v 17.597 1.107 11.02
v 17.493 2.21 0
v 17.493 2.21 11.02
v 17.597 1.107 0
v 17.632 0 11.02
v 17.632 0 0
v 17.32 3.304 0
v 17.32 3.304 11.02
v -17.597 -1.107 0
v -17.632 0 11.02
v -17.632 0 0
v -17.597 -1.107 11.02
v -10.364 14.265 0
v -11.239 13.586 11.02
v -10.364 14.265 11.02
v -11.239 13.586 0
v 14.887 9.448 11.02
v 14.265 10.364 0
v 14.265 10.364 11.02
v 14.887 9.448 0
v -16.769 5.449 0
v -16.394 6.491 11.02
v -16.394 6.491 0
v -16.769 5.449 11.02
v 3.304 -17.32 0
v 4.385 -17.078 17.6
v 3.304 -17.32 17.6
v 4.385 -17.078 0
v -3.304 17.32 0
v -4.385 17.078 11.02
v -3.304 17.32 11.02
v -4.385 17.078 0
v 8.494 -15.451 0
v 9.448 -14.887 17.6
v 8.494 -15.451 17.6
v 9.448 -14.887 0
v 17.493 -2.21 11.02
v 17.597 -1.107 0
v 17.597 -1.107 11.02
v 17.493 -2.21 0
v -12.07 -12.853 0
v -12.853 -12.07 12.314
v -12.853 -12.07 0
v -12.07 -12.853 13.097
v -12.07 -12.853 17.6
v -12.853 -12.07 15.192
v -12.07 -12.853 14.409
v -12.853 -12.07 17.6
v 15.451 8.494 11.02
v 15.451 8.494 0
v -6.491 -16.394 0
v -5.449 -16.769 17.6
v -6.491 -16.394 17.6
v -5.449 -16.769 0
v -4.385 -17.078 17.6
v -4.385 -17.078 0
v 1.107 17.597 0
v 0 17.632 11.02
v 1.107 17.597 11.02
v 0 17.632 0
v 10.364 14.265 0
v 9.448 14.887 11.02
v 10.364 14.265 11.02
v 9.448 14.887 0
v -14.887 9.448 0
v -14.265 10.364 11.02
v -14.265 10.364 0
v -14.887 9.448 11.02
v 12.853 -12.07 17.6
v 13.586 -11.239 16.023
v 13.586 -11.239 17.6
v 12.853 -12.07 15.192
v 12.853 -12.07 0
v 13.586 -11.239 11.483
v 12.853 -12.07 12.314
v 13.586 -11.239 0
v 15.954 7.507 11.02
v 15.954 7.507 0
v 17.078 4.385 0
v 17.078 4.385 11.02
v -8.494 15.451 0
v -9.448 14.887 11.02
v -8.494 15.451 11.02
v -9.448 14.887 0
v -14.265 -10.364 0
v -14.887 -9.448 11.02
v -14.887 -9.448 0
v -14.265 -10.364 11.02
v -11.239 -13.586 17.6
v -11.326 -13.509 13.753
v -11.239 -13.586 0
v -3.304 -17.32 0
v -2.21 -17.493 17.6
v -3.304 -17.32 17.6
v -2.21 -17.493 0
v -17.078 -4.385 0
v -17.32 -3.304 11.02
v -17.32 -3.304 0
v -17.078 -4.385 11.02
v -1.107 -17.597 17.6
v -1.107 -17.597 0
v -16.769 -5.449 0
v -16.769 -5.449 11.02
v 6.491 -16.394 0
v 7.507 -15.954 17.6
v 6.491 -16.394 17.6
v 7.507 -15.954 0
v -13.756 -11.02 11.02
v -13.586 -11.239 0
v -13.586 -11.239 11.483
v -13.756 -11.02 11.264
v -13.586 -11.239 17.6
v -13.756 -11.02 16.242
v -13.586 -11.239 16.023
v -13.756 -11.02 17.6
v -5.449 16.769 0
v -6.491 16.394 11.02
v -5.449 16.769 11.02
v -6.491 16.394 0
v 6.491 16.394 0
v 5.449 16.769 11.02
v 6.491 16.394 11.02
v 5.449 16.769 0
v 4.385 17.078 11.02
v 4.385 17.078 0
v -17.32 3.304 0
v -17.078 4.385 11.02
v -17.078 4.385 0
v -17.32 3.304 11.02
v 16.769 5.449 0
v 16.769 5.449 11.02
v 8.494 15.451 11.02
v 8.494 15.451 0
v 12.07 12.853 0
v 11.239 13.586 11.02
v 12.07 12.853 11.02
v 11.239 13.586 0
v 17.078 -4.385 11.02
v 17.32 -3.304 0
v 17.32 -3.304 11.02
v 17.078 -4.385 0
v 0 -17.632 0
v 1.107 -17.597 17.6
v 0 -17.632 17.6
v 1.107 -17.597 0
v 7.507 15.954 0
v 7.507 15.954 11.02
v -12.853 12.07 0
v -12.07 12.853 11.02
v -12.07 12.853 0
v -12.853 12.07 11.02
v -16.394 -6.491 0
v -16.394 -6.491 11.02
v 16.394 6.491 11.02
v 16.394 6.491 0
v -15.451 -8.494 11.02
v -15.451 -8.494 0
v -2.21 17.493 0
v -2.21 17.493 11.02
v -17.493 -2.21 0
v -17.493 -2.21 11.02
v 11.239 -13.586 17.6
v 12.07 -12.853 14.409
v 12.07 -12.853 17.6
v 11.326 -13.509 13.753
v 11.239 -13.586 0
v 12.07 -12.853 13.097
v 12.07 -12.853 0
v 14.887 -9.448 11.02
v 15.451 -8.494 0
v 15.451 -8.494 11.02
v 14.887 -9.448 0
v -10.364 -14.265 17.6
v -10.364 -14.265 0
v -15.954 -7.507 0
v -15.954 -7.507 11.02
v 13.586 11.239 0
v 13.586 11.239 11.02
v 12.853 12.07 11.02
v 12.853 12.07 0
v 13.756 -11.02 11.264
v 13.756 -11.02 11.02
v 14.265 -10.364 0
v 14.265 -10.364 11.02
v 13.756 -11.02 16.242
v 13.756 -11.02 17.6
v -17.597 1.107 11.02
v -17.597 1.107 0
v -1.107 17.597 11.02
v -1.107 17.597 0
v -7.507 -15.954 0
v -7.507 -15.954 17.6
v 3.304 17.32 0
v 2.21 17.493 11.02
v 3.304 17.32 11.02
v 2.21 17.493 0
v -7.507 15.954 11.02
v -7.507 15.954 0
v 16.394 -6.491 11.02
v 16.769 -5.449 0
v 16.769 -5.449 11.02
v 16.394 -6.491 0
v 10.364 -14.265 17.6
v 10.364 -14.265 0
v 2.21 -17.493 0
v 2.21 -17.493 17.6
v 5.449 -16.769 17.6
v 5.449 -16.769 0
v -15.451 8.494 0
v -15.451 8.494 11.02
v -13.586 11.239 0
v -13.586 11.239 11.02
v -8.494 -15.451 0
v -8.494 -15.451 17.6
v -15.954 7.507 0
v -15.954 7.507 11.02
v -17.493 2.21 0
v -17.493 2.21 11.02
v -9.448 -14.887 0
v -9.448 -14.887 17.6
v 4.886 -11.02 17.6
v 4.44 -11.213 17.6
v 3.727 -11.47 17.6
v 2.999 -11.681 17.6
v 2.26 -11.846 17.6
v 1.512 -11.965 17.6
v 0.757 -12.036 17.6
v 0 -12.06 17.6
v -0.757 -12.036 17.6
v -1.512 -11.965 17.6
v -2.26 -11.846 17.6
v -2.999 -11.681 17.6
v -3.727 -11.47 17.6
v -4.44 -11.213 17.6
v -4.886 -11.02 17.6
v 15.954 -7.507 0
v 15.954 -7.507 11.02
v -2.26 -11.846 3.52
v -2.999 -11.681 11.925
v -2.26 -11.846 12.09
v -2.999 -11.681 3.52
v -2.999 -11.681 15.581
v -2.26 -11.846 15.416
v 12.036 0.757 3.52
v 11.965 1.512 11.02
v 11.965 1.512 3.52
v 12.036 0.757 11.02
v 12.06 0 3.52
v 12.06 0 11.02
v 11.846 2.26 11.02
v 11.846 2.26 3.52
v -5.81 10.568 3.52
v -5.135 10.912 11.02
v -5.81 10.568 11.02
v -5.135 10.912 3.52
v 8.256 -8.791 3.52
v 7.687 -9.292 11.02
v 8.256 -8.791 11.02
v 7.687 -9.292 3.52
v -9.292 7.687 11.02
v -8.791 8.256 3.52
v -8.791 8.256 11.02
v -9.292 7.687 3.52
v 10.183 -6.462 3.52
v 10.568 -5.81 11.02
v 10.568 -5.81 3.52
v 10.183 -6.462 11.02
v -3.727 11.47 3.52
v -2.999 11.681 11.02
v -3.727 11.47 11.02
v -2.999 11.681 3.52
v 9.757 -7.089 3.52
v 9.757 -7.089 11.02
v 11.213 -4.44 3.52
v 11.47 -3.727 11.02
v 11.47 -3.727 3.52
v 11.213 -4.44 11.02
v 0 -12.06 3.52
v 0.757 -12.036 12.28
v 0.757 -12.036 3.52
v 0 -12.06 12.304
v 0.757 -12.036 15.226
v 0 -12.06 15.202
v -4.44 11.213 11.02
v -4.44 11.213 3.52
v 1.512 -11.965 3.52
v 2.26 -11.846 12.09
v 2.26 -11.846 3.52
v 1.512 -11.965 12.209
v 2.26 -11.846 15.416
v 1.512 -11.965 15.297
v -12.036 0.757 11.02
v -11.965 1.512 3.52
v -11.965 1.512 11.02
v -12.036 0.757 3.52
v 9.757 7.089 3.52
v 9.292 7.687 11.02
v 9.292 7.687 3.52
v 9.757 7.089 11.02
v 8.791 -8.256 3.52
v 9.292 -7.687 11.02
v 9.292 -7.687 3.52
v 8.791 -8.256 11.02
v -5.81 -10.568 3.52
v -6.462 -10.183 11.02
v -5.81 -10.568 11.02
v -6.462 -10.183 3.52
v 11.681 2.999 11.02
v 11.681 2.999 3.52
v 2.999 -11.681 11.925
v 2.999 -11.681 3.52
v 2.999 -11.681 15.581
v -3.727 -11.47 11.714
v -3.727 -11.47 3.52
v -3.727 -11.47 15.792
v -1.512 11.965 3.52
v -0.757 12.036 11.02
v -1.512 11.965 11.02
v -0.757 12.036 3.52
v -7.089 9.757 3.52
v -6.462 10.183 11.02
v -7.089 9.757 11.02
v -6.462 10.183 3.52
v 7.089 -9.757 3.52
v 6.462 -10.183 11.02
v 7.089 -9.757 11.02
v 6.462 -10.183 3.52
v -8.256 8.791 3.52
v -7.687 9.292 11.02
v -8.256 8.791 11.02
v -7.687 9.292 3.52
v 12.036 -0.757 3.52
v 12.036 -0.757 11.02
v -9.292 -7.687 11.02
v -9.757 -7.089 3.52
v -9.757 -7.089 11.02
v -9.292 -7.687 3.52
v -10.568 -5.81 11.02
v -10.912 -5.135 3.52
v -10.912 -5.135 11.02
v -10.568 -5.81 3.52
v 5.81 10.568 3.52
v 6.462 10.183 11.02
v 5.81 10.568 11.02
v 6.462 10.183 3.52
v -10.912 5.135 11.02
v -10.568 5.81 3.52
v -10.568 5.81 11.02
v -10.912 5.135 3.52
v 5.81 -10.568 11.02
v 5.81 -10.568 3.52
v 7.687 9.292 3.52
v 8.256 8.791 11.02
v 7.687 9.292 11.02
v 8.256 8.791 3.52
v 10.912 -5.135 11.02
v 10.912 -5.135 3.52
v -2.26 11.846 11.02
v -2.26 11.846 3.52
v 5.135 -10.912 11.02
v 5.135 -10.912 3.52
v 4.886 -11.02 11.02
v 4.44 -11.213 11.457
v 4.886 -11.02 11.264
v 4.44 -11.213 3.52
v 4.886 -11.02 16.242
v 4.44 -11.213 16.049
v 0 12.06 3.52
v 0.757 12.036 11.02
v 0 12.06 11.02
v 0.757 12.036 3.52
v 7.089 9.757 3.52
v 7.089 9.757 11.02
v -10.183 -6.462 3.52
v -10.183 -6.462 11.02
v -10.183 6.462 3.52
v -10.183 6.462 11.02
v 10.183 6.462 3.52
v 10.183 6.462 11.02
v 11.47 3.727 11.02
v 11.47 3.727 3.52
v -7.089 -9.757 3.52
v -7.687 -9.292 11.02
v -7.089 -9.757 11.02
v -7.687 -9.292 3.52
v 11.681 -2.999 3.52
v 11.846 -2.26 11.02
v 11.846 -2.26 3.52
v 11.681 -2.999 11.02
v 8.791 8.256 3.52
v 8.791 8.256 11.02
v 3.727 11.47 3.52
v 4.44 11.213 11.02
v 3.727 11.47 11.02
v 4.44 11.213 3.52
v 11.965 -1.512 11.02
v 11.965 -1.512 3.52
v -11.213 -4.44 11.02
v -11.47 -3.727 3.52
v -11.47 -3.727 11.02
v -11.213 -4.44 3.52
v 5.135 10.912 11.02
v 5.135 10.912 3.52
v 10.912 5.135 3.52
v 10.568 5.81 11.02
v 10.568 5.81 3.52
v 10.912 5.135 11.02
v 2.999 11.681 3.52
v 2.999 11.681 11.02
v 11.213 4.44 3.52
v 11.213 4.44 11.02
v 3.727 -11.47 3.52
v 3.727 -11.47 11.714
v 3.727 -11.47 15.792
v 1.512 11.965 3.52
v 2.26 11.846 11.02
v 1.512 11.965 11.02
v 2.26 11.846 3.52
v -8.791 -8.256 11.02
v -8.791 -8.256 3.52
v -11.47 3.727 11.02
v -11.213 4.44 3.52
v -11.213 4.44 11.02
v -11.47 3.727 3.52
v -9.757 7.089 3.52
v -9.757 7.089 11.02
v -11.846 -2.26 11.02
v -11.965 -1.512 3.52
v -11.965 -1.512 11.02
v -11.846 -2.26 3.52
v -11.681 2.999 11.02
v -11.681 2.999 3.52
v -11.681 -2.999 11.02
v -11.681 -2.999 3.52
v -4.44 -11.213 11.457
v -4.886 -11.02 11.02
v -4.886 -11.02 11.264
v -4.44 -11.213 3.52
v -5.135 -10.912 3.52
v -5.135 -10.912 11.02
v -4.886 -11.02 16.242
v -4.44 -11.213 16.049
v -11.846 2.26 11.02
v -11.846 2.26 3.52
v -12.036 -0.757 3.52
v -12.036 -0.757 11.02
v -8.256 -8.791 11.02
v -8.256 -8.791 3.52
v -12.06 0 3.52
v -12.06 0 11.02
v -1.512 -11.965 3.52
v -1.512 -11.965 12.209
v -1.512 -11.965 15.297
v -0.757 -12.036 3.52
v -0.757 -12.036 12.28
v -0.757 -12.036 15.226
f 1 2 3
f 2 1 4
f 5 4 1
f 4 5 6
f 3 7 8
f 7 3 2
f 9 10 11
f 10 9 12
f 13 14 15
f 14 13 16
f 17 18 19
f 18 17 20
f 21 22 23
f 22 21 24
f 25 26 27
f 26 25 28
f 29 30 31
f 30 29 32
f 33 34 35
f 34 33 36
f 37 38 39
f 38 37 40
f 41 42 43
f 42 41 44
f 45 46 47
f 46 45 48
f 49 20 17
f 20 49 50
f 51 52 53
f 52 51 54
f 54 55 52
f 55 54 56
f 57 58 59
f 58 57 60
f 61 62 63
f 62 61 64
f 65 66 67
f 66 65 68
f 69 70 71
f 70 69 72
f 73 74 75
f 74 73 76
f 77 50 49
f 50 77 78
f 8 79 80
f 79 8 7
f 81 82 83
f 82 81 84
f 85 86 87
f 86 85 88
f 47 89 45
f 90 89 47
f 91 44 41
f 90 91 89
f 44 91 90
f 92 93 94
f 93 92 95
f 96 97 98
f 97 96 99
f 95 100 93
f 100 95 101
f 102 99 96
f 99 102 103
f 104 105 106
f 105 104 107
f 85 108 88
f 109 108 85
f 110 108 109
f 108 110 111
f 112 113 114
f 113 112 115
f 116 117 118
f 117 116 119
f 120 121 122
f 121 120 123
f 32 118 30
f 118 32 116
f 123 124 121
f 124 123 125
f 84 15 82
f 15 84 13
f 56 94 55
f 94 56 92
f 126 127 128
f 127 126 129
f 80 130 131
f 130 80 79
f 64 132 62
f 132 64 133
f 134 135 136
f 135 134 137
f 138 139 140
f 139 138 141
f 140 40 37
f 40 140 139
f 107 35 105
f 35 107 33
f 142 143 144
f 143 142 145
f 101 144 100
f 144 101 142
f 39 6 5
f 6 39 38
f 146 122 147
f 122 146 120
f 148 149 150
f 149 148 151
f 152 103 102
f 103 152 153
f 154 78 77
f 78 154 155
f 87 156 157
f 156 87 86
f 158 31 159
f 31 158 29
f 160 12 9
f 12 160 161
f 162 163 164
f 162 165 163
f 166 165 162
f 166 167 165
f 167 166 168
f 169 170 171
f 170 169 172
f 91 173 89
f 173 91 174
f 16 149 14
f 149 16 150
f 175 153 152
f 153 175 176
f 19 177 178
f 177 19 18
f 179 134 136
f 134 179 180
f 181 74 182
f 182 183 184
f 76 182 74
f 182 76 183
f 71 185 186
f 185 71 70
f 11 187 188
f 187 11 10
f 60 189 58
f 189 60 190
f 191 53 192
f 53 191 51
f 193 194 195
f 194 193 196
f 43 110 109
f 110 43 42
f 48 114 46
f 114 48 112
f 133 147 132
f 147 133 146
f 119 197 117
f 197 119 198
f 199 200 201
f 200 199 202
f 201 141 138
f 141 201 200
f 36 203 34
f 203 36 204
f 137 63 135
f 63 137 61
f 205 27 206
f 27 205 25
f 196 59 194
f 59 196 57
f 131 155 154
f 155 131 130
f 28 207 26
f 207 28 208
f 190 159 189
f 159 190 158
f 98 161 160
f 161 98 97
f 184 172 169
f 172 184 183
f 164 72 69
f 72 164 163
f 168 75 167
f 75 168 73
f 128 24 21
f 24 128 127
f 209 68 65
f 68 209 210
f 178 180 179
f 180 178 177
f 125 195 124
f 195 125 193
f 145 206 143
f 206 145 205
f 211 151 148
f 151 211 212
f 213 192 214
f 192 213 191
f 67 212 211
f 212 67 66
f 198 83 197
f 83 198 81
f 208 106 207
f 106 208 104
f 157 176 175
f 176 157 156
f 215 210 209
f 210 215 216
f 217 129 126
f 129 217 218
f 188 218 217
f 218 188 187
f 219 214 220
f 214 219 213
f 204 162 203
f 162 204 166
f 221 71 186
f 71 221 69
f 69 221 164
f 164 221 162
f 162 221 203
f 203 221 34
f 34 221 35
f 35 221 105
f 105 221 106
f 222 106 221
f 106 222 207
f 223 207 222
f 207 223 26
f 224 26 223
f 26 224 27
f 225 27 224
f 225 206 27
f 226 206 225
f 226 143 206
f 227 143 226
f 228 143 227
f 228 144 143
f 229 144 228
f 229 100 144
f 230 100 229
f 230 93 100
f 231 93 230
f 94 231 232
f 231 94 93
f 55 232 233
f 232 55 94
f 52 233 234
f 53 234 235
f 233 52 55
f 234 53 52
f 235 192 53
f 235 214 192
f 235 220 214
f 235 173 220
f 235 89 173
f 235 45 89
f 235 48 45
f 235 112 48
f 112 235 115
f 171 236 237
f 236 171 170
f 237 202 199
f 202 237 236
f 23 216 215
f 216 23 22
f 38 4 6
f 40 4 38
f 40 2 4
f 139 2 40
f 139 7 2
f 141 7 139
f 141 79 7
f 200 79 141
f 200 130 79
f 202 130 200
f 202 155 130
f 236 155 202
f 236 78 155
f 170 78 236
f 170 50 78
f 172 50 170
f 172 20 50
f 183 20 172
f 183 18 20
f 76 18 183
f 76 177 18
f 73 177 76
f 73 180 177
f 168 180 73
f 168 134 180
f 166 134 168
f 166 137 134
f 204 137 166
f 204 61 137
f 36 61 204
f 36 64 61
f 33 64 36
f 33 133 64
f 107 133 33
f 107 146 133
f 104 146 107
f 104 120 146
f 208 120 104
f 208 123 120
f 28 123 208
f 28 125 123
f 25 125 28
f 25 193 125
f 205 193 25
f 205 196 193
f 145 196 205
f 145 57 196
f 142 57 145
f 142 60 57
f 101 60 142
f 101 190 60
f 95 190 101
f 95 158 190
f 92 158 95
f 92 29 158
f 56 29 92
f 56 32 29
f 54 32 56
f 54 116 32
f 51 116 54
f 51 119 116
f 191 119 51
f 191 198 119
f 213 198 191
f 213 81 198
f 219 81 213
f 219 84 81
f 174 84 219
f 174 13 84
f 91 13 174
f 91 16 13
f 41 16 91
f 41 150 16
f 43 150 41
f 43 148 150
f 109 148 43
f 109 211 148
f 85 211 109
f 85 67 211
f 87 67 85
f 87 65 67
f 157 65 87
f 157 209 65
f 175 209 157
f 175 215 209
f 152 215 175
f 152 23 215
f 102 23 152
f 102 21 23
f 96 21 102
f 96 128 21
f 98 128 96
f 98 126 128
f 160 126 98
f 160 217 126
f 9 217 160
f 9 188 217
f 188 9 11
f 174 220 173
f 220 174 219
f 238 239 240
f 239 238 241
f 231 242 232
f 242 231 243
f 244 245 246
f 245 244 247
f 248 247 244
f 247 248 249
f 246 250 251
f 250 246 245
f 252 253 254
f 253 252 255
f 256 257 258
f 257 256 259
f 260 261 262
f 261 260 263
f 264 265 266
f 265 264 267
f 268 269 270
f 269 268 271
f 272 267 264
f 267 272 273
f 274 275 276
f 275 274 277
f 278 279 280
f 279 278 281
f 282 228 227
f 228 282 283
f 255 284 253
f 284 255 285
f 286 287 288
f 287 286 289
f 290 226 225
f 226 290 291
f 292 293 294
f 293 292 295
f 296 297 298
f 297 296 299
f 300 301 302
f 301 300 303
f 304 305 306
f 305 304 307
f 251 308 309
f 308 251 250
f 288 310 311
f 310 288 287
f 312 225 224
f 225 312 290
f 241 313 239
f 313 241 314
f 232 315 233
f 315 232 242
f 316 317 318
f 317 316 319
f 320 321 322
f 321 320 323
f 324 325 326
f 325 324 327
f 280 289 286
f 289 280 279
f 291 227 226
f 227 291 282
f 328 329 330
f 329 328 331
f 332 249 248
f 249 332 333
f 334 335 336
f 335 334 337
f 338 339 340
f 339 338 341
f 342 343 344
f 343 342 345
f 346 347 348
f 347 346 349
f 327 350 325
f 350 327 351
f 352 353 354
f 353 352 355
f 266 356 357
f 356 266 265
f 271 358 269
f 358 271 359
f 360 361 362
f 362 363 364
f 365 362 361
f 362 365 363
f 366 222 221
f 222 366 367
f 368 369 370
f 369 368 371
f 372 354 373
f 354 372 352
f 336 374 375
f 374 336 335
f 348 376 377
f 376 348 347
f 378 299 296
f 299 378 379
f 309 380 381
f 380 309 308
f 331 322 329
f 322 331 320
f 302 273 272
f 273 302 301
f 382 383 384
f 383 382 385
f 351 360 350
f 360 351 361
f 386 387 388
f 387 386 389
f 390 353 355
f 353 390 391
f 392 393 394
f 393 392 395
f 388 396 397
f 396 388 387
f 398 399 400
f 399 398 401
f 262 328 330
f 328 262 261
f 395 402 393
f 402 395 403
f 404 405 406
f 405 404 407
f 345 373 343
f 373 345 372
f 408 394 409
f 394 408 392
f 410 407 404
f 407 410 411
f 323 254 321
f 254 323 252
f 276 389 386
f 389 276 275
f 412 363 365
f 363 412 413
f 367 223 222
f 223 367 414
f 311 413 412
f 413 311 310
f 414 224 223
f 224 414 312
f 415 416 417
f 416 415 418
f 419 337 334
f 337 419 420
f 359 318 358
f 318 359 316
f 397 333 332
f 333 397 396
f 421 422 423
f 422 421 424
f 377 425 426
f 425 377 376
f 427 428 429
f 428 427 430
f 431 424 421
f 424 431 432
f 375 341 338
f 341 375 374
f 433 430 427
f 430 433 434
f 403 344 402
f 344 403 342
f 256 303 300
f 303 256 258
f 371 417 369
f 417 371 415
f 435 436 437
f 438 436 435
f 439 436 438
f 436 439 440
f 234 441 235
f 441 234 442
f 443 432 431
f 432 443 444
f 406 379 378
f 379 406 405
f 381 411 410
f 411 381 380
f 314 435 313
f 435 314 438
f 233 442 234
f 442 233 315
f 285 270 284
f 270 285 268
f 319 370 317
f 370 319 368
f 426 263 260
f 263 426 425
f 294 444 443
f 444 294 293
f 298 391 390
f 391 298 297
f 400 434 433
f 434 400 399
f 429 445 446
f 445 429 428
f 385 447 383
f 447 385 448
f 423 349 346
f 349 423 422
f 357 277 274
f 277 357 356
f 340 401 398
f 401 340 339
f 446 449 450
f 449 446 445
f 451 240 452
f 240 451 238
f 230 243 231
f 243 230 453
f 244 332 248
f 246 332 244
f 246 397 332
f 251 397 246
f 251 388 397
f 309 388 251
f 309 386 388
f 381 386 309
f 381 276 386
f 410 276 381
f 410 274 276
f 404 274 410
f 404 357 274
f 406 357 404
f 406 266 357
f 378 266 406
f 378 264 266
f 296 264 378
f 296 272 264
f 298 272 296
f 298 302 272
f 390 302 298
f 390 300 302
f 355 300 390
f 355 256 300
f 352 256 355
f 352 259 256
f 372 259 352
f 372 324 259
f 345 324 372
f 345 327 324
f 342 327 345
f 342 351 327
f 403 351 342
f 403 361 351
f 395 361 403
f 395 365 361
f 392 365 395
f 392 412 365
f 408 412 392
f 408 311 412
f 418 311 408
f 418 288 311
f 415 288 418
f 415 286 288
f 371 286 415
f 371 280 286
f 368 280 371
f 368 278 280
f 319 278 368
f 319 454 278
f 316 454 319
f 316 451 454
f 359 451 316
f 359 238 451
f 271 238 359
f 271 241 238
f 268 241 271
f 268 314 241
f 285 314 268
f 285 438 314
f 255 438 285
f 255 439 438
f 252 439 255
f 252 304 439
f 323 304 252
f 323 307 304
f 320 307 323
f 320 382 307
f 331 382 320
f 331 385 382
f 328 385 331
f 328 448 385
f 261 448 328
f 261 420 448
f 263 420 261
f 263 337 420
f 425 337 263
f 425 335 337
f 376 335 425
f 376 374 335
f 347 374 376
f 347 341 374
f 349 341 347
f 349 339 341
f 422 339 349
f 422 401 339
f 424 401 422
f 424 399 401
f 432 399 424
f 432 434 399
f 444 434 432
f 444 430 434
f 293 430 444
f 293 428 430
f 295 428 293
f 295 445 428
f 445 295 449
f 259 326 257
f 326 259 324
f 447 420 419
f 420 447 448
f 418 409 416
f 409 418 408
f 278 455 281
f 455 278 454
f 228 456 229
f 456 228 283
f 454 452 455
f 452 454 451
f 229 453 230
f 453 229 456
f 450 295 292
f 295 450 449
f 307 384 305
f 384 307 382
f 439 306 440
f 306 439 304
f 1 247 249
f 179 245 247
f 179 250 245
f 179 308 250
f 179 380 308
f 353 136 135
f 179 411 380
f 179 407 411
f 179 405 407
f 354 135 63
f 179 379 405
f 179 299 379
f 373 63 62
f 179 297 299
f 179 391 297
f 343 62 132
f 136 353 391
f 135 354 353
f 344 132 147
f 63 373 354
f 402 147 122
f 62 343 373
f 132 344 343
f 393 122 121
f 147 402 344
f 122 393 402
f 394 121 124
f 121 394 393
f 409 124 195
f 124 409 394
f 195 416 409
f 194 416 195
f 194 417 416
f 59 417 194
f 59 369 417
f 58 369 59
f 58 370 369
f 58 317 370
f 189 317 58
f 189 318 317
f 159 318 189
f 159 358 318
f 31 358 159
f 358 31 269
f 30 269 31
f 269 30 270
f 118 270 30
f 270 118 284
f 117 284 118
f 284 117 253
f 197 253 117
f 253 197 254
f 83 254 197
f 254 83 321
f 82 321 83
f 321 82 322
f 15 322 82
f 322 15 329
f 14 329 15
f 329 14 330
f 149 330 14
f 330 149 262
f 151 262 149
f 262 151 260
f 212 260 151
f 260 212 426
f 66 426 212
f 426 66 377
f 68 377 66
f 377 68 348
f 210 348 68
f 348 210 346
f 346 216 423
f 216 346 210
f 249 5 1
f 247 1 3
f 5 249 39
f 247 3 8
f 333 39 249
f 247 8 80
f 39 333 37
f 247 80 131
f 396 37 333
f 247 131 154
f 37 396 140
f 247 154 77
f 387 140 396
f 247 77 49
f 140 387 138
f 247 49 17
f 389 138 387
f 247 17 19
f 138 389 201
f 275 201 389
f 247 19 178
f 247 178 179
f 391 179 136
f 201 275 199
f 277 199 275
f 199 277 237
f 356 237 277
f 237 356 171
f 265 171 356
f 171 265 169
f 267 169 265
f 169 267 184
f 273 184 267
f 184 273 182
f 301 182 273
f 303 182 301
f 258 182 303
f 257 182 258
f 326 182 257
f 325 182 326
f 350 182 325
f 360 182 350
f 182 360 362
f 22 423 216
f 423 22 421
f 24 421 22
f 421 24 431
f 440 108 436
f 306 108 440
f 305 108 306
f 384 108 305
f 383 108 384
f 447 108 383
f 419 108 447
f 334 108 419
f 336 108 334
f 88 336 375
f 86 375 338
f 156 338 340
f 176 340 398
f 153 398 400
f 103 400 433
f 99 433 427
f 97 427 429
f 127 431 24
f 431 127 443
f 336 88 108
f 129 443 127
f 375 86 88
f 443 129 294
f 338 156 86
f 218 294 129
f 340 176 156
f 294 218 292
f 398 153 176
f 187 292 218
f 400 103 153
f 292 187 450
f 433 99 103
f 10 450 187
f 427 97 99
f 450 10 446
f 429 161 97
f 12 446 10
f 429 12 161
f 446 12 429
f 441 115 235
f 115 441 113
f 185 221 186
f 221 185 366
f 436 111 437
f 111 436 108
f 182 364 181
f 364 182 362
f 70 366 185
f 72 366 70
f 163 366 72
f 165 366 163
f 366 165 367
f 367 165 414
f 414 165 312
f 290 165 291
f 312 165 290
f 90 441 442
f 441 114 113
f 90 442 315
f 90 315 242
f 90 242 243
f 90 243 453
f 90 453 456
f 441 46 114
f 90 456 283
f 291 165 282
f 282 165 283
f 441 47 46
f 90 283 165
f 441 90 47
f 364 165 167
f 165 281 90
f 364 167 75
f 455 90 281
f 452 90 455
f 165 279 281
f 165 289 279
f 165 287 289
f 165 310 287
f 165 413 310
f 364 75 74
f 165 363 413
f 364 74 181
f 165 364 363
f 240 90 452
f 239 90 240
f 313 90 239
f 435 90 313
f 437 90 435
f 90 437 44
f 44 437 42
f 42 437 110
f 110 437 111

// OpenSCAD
// file: Vitamins/PlasticScrew.scad
use <../Parameters.scad>

function ScrewDiameter()= 3 + 3dPrinterTolerance();
function ScrewLength()= 22 + 3dPrinterTolerance();
function ScrewHeadDiameter()= 6.7 + 3dPrinterTolerance();
function ScrewHeadHeight()= 2.5 + 3dPrinterTolerance();

//err on the side of smaller tolerances for screws

module screw()
{
	union()
	{
		translate([0,0,-ScrewLength()])
		{
			cylinder(ScrewLength(), ScrewDiameter()/2,ScrewDiameter()/2);
		}
		cylinder(ScrewHeadHeight(), ScrewHeadDiameter()/2,ScrewHeadDiameter()/2);
	}
}

screw();
// file: Vitamins/Zrod.scad
function ZrodLength()=1000;
function ZrodDiameter()=4;  //base case: 8
function ZrodRadius()=ZrodDiameter()/2;

module Zrod()
{
color("Silver")
cylinder(ZrodLength(), ZrodRadius(), ZrodRadius());
}

Zrod();
// file: Vitamins/BallBearing.scad
use <../Parameters.scad>

function BallBearingDiam() = 22 + 3dPrinterTolerance();
function BallBearingHeight() = 7 + 3dPrinterTolerance();
function BallBearingInnerDiam()=8 + 3dPrinterTolerance();

module BallBearing()
{
cylinder(BallBearingHeight(), BallBearingDiam()/2, BallBearingDiam()/2);
}


BallBearing();
// file: Parameters.scad
use<Vitamins/Zrod.scad>

function mm(i) = i*25.4; 

//Build dimensions (x,y,z)-- x, y and z of printable area, NOT of overall device

//z-rod length, diameter-- dependent on which rods you buy
//(bearing diameter is dependent on rod diameter)



function ZrodSpacing()=66;


//parametric of which hotend is being used (printerbot or bucha nozzle)

//stepper vs servo

//3 parameters (1 for each link) horizontal vs vertical

//paper is a parametric vitamin

//distance between link arms will be calculable based on radius of toolplate





//tolerances
function LaserCutTolerance() = .02;
function 3dPrinterTolerance() = .04;




//the equation used for plastic width, it can of course be changed
function PlasticWidth()= (ZrodDiameter()/2);
function SideWidth() = (ZrodDiameter()+PlasticWidth());
// main file
use <Parameters.scad>
use <Vitamins/BallBearing.scad>
use <Vitamins/Zrod.scad>
use <Vitamins/PlasticScrew.scad>

$fn=100;

height=ZrodSpacing();
Bdiam=BallBearingDiam();

//this creates the perpendicular bearing rest.
module BearingRecess(){

difference(){
	cylinder(BallBearingHeight()*2.5,Bdiam/1.25,Bdiam/1.25);  
	translate([0,0,BallBearingHeight()/2]){
		cylinder(BallBearingHeight()*2.5,(Bdiam/2)+1+3dPrinterTolerance(),(Bdiam/2)+1+3dPrinterTolerance());
	}
	translate([-BallBearingHeight()*4,-Bdiam/2,Bdiam/2]){
		cube([BallBearingHeight()*8,BallBearingHeight()*6,Bdiam]);
	}
//Below creates the notch for the bearing cover. in the future change the dimensions to parameterize with the cover.
	translate([-BallBearingHeight()*2,-Bdiam/2,BallBearingHeight()*1.6]){
		rotate([45,0,0]){
			cube([BallBearingHeight()*4,BallBearingHeight()/2,BallBearingHeight()/2]);
		}	
	}
}
}
module hole(){

cylinder(ScrewLength(),ScrewDiameter()/2,ScrewDiameter()/2);
}

module BearingHole(){

cylinder(BallBearingHeight()+10,BallBearingInnerDiam(),BallBearingInnerDiam());
}

module KnuckleShaft(){
	
difference()	{	
	rotate([90,0,0]){
		translate([0,0,-height+Bdiam]){
			cylinder(height,Bdiam/2,Bdiam/2);
		}
	}
	rotate([90,0,0]){
		translate([-height/2,-height,-height/2-Bdiam-2]){
			cube([height,height,height+2*Bdiam]);
		}
	}
	translate	([0,height*.4,-Bdiam/12]){
		hole();
	}
	translate([0,-height*.1,-Bdiam/12]){
		hole();
	}
}
}

//KnuckleShaft();
//translate([0,-height/1.8,0]){
BearingRecess();
//}

//translate([0,0,20]){
